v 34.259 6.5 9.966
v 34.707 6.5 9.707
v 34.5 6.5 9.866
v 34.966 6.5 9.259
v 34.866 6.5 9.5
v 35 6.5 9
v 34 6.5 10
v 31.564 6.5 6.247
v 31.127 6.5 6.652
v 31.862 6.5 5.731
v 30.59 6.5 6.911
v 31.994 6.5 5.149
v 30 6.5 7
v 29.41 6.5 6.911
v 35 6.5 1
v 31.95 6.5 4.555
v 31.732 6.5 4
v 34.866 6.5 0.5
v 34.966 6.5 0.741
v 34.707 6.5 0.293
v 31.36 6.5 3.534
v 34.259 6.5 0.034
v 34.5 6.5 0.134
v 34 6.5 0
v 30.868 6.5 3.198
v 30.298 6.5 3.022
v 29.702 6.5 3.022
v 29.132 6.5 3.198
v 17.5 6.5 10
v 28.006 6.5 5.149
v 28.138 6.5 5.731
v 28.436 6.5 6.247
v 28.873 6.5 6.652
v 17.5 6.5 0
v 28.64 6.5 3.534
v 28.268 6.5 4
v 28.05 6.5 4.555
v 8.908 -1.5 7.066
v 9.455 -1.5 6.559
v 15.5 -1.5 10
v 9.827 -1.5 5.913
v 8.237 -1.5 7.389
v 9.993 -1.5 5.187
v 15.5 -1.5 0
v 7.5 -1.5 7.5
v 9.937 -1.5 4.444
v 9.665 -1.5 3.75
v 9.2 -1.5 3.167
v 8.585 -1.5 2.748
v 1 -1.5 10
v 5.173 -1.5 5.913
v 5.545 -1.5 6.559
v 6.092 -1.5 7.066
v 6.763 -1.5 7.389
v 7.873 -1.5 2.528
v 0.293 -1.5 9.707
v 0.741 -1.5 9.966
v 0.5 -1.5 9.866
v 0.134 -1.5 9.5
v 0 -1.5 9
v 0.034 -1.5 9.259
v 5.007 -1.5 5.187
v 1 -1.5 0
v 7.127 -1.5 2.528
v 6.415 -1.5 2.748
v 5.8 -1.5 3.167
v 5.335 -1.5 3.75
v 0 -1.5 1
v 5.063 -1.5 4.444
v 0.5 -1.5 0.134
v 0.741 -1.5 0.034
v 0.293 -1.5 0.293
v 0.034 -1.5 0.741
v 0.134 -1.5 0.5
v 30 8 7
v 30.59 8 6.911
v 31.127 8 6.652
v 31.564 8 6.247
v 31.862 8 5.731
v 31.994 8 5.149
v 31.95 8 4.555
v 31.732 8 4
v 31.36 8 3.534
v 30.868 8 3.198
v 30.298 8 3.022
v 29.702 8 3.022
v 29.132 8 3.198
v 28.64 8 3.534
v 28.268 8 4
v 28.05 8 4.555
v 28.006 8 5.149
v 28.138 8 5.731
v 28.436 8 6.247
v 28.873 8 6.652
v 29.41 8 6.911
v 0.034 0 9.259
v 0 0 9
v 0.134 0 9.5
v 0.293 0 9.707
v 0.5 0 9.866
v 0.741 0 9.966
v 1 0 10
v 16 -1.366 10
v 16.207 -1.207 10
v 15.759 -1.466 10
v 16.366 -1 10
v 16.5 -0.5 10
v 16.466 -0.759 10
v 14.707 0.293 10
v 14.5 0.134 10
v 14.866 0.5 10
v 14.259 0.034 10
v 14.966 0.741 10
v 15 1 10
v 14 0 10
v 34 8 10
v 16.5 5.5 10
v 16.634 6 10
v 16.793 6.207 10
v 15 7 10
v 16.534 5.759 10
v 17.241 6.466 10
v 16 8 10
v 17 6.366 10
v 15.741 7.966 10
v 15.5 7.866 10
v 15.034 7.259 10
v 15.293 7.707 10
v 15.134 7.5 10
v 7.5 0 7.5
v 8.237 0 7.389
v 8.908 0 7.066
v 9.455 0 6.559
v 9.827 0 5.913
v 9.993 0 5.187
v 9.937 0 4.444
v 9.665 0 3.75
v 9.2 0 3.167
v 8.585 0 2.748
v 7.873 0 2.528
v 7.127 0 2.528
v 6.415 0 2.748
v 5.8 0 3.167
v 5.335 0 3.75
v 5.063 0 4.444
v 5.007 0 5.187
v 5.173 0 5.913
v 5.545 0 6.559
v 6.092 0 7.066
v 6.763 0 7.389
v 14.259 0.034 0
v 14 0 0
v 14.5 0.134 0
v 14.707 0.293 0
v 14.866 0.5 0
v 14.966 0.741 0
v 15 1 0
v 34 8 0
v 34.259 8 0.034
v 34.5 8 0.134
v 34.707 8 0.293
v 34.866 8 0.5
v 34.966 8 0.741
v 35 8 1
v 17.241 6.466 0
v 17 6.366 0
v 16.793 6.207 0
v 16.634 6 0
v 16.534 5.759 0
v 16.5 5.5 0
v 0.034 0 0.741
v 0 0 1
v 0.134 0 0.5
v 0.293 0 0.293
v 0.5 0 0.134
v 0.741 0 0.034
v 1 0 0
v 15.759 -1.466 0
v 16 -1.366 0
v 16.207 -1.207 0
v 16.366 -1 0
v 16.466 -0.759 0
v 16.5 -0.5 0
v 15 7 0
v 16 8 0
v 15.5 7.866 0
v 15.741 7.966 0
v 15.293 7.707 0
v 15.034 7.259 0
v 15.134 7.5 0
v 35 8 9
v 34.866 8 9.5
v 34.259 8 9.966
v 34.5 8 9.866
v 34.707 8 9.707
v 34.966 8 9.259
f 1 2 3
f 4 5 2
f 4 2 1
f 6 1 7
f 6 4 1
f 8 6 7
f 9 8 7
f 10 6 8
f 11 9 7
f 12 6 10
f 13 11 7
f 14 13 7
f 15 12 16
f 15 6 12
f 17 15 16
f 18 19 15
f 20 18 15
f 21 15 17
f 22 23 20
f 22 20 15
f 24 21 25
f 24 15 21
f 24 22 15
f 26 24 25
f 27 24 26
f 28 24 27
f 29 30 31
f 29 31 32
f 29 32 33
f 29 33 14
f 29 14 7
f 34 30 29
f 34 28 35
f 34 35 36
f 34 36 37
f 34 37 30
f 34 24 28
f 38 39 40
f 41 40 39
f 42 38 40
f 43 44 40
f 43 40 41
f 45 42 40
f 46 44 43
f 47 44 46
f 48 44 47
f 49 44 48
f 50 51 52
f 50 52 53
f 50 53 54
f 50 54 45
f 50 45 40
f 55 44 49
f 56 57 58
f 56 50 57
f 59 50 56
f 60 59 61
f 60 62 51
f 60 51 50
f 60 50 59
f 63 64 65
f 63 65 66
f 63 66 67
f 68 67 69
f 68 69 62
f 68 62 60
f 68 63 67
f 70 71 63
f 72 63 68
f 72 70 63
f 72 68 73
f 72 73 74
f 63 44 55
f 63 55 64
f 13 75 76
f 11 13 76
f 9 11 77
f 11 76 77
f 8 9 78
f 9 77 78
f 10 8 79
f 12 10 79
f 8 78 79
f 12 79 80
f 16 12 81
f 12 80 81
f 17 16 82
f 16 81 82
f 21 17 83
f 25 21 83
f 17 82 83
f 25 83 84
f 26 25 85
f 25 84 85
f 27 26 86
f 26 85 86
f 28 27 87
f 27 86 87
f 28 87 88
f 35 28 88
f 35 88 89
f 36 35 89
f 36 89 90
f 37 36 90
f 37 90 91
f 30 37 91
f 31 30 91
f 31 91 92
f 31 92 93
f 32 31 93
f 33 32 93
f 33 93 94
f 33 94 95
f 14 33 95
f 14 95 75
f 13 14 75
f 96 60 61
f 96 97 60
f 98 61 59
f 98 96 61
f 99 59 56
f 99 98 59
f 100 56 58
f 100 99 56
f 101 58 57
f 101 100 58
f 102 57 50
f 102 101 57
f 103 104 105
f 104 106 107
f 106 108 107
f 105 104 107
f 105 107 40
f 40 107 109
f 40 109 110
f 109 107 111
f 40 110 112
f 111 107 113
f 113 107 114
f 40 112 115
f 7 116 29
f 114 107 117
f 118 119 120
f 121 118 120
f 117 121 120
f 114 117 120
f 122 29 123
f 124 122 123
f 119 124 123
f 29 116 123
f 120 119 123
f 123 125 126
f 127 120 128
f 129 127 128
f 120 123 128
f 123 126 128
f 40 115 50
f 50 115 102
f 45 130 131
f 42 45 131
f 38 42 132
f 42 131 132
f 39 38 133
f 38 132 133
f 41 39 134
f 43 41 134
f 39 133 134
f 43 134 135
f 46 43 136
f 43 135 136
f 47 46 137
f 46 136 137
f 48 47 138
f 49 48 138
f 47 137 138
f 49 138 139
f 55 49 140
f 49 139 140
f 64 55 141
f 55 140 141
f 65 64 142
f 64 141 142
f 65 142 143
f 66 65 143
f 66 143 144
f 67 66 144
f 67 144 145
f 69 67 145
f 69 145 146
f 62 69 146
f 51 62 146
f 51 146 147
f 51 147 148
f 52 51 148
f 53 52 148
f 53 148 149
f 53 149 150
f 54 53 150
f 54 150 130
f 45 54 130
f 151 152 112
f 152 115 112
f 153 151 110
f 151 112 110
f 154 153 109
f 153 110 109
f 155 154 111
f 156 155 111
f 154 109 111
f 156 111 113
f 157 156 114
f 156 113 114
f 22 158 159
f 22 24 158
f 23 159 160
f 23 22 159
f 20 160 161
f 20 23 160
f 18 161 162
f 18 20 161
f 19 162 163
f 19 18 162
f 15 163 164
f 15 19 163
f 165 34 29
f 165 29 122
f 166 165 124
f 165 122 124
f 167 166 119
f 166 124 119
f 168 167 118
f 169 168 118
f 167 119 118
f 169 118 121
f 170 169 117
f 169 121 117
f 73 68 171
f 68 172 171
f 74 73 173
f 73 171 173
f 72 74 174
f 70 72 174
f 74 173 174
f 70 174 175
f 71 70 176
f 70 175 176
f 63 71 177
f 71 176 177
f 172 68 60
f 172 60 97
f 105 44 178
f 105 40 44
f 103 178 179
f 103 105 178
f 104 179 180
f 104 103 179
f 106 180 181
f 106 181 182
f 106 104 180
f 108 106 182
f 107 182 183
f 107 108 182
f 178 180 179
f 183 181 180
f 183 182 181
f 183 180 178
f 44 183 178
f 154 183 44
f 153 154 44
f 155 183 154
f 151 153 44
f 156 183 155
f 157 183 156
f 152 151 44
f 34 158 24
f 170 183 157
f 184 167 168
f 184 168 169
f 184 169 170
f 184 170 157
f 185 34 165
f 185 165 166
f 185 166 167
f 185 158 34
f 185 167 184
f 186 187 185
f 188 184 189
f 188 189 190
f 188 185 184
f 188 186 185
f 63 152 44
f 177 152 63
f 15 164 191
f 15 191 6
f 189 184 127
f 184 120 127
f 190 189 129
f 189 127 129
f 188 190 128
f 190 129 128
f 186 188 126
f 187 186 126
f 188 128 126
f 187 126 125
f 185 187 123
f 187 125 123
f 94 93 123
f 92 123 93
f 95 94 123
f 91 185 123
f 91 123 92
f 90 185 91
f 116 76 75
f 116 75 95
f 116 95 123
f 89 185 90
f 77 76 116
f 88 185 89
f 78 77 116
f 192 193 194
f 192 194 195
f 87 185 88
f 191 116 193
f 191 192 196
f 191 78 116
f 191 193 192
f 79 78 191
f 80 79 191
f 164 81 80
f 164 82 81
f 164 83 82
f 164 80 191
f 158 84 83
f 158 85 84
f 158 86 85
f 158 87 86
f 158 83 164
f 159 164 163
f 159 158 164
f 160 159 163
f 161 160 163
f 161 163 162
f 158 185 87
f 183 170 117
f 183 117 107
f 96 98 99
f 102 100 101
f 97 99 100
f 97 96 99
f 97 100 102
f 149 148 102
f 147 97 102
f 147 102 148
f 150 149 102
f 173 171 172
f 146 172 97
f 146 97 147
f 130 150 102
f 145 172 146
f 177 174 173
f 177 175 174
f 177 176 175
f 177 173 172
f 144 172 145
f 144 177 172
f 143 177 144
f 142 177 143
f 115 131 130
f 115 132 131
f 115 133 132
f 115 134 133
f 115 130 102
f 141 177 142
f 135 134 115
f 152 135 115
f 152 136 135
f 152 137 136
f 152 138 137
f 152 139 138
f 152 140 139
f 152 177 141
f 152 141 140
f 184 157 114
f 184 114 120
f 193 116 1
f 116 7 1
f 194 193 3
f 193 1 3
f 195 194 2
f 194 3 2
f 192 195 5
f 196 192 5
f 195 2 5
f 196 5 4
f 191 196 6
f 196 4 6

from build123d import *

# Parameters (mm, degrees)
EXTRUDE_THIN1_DEPTH = 10
SKETCH2_R           = 2
SKETCH2_R_2         = 2.5
CUT_EXTRUDE1_DEPTH  = 38.619808612
FILLET2_R           = 1


with BuildPart() as part:
    # Sketch1 → Extrude-Thin1 (new body)
    with BuildSketch(Plane.XY):
        Polygon((0, 0), (15, 0), (15, 8), (35, 8), (35, 6.5), (16.5, 6.5), (16.5, -1.5), (0, -1.5), align=None)
    extrude(amount=EXTRUDE_THIN1_DEPTH)

    # Sketch2 → Cut-Extrude1 (cut, through all)
    with BuildSketch(Plane(origin=(0, 8, 0), x_dir=(1, 0, 0), z_dir=(0, 1, 0))):
        with Locations(Location((30, -5, 0), (0, 0, 270))):
            Circle(SKETCH2_R)
        with Locations(Location((7.5, -5, 0), (0, 0, 270))):
            Circle(SKETCH2_R_2)
    extrude(amount=-CUT_EXTRUDE1_DEPTH, mode=Mode.SUBTRACT)

    # Fillet2
    fillet2_edges = [part.edges().sort_by_distance(p)[0] for p in [
        (16.5, 6.5, 5),
        (16.5, -1.5, 5),
        (15, 0, 5),
        (15, 8, 5),
        (0, -0.75, 10),
        (0, -0.75, 0),
        (35, 7.25, 10),
        (35, 7.25, 0),
    ]]
    fillet(fillet2_edges, radius=FILLET2_R)


solid = part.part
